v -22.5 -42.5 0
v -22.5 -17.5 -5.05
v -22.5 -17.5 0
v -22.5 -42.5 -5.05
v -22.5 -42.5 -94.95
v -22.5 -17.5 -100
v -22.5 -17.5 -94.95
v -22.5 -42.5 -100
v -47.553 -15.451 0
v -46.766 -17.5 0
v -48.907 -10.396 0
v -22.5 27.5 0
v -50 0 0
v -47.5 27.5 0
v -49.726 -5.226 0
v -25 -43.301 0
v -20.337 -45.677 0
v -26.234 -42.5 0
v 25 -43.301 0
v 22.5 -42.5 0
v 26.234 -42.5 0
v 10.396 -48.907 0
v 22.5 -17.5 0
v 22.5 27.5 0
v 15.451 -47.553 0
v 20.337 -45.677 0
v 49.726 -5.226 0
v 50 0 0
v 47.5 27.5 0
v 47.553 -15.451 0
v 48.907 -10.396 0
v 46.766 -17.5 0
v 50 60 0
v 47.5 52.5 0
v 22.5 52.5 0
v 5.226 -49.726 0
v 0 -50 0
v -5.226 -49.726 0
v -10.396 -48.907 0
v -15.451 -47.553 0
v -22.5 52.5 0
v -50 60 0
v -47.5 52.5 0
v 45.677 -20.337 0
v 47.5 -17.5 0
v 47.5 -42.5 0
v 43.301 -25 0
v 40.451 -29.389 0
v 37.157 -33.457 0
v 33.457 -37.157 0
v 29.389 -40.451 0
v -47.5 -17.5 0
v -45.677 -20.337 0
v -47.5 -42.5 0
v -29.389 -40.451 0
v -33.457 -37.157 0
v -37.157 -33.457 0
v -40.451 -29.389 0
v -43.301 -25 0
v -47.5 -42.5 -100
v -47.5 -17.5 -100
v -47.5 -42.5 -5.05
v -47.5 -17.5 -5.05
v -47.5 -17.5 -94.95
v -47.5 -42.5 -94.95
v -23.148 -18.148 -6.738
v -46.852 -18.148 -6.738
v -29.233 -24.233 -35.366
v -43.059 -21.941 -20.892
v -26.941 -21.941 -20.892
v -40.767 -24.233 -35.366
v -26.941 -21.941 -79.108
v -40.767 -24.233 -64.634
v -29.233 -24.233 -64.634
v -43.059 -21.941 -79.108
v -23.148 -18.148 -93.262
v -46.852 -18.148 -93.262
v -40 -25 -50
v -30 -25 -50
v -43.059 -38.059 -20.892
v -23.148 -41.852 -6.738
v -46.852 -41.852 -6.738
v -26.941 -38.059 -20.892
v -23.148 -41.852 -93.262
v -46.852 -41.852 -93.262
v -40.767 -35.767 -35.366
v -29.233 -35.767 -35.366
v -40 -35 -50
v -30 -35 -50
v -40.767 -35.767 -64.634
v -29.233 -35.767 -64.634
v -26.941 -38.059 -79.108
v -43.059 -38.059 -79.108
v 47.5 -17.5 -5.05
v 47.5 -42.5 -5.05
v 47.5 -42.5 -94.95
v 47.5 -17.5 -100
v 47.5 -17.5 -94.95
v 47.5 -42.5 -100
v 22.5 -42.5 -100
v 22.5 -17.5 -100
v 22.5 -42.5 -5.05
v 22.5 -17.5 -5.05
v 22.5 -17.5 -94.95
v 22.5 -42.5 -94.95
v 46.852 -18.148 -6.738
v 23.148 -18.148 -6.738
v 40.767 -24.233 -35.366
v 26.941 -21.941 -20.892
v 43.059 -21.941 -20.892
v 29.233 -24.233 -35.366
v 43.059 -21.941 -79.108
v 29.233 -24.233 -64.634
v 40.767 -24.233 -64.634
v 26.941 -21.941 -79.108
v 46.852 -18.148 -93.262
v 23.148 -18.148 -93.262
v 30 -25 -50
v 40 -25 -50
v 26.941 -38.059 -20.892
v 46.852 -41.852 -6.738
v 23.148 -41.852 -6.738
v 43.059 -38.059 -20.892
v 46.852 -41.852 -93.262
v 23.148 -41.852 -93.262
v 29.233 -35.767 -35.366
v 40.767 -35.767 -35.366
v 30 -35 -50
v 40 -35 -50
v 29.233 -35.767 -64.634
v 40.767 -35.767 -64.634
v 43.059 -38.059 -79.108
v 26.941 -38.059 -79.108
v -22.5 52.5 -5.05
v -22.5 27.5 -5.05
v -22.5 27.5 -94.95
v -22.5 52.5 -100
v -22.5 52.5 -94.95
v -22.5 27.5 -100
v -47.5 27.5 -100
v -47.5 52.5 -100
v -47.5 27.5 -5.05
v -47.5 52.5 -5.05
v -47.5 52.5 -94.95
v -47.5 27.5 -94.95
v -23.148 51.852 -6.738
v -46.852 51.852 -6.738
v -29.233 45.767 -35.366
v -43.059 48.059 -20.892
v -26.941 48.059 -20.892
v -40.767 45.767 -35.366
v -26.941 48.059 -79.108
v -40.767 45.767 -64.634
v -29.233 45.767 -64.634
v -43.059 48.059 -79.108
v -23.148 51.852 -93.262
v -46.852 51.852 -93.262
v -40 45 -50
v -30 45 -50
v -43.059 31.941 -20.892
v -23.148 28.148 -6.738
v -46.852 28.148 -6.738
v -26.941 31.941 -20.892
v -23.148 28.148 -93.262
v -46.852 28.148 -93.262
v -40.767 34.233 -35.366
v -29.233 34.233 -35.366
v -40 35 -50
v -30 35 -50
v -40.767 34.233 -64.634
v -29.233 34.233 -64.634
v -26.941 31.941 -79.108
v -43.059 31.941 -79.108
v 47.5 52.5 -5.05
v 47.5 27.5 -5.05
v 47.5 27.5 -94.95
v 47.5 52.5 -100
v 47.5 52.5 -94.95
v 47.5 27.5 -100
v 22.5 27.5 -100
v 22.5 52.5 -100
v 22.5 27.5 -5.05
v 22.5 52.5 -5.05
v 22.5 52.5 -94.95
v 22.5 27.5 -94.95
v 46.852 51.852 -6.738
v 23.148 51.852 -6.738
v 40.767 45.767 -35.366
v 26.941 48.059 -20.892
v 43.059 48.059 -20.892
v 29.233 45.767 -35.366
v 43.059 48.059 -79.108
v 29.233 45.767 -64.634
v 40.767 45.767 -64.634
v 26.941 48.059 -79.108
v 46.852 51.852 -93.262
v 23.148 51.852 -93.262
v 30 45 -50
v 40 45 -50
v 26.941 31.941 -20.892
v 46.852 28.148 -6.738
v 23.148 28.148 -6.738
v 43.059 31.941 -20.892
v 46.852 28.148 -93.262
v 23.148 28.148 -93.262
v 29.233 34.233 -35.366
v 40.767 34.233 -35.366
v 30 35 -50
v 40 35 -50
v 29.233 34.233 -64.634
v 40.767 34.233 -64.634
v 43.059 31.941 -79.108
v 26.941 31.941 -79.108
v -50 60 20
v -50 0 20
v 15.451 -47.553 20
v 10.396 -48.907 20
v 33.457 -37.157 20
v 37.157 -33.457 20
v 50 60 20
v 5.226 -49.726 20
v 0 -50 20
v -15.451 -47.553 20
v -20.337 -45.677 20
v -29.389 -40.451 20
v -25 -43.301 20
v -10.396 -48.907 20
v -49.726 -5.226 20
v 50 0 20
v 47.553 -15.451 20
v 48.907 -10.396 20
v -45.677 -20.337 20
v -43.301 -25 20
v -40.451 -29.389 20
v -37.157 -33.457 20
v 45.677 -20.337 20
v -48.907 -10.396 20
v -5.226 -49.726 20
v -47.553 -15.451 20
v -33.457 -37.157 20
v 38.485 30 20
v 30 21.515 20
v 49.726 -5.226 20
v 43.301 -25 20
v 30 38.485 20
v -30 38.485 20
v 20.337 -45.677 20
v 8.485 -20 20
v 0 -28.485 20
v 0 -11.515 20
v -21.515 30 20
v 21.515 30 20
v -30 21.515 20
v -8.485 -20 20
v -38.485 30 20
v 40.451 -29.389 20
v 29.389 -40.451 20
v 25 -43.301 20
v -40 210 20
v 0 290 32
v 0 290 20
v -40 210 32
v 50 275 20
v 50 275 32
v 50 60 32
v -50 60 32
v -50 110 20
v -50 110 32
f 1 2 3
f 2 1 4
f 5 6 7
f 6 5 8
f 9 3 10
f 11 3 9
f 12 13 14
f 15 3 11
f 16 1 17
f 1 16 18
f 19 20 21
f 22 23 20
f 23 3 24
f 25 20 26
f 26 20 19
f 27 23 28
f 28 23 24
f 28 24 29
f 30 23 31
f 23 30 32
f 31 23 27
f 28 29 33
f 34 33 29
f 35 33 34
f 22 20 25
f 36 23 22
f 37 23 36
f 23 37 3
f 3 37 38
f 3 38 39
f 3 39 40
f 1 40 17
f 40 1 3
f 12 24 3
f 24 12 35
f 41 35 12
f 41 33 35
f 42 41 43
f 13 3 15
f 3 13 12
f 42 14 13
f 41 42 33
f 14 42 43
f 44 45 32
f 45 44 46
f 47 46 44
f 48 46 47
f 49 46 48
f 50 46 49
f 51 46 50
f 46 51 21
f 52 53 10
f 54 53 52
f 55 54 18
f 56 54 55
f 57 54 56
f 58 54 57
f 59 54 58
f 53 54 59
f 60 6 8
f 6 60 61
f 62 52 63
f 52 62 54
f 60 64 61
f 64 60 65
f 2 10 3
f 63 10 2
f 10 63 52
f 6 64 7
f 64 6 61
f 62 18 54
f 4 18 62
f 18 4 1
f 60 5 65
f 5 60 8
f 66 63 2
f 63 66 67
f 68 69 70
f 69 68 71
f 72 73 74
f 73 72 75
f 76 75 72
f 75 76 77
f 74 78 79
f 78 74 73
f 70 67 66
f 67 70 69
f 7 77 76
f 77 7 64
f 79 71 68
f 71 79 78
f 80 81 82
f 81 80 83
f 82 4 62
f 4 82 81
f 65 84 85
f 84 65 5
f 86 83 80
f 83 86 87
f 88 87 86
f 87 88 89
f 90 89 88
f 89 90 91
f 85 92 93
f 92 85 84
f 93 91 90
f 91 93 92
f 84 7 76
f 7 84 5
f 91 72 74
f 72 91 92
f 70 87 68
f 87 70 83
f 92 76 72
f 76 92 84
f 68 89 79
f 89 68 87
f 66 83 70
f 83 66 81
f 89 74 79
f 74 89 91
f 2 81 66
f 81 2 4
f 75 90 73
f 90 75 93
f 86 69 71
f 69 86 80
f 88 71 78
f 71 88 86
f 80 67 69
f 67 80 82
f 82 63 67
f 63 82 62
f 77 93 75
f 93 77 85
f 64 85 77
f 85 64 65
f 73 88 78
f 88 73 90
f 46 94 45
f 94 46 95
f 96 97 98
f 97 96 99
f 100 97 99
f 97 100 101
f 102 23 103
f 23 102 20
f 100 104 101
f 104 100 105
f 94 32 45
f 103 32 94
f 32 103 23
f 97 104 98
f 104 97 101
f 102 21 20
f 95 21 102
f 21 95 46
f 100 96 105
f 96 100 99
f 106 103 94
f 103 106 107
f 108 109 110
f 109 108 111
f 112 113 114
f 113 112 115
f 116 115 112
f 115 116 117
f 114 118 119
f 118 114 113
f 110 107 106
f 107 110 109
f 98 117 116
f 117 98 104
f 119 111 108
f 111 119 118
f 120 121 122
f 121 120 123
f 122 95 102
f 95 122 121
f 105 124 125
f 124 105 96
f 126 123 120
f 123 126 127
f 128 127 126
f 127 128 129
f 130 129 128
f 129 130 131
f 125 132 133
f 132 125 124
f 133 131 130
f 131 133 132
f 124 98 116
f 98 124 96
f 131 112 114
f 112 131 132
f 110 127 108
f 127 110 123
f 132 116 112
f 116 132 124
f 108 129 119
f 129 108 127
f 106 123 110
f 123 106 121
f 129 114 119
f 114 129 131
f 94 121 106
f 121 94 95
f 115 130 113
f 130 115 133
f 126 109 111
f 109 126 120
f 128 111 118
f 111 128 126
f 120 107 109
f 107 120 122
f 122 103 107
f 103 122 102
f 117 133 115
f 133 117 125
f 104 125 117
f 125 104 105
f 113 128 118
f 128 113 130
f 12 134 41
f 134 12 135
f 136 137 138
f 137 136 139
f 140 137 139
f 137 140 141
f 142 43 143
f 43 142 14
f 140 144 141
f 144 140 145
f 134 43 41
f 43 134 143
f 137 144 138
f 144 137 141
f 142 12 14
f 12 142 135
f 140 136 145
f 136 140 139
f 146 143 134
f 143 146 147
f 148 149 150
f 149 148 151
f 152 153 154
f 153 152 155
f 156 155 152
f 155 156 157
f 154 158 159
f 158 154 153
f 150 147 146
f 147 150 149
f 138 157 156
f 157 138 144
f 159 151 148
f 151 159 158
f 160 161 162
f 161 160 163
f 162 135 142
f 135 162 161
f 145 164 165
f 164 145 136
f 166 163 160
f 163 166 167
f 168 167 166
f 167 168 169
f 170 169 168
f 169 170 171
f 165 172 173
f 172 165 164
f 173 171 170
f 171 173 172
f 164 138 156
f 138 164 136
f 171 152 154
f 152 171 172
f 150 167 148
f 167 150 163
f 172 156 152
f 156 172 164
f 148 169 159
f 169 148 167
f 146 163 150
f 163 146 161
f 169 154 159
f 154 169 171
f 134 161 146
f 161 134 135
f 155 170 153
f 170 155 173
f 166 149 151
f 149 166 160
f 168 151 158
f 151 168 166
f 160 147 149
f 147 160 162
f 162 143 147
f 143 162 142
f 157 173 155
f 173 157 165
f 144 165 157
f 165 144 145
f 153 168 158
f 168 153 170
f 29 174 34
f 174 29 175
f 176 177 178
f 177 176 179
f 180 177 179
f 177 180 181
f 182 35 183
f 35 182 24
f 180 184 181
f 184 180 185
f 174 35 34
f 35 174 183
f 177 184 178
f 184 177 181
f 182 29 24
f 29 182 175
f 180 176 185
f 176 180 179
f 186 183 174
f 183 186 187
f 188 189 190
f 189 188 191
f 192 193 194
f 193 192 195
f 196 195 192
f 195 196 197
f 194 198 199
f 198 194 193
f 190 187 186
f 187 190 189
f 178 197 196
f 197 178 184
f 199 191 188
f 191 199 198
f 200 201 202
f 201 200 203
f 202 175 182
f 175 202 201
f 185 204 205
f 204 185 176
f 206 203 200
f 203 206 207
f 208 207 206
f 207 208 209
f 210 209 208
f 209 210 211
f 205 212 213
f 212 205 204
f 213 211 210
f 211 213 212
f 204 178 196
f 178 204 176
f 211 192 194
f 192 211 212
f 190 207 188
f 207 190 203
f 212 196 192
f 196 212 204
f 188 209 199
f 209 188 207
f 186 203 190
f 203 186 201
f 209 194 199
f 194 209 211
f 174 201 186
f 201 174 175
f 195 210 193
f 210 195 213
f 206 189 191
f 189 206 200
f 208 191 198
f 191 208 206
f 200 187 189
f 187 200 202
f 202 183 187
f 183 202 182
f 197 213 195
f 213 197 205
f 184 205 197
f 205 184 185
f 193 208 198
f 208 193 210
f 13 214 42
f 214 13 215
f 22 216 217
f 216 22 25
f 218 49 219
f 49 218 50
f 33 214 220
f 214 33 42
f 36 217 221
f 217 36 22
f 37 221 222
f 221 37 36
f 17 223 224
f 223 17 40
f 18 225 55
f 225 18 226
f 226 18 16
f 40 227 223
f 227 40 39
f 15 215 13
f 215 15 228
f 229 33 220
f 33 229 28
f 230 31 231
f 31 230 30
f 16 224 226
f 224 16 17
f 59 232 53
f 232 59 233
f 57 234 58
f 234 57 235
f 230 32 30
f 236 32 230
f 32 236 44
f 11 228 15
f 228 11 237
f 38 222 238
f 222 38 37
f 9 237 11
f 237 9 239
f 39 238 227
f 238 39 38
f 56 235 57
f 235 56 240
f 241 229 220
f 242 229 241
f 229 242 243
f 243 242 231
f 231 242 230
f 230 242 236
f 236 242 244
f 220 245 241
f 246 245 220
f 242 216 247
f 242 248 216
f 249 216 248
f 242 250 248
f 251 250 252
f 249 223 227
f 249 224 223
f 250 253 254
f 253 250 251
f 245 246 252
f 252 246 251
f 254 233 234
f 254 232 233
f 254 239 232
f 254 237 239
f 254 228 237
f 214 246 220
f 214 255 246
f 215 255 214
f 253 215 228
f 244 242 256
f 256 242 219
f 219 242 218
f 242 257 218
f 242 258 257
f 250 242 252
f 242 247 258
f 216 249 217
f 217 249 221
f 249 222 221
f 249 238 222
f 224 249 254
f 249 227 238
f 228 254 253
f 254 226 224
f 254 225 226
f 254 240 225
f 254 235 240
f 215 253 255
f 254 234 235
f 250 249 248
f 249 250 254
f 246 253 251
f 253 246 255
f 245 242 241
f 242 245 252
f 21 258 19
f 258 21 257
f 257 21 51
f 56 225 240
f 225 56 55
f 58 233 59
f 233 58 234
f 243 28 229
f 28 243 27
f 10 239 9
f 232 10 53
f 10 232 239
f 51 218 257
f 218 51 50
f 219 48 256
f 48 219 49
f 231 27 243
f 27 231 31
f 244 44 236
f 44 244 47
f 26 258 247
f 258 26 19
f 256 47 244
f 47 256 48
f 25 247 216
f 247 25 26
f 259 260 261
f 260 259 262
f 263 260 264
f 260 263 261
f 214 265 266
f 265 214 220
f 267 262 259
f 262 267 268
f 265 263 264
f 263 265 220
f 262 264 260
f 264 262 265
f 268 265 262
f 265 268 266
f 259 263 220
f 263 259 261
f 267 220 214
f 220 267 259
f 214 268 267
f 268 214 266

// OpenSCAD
// Stylized Chair Assembly
// Reconstructed from image and description

$fn = 60; // Resolution for curves

// --- Parameters ---
// Seat Dimensions
seat_width = 100;
seat_depth_rect = 60;
seat_radius = 50;
seat_thickness = 20;

// Backrest Dimensions
backrest_height = 215;
backrest_thickness = 12;

// Leg Dimensions
leg_height = 100;
leg_base_size = 25;
leg_waist_radius = 140; // Large radius for concave sides

// Cutout Dimensions
diamond_size = 12;
diamond_depth = 50; // Through cut

// --- Modules ---

// Module for the waisted leg
module waisted_leg() {
    h = leg_height;
    w = leg_base_size;
    cut_pos = 145; 
    
    difference() {
        // Base cube
        cube([w, w, h], center=true);
        
        // Carve the waist (concave cylindrical sides)
        // Front (+Y)
        translate([0, cut_pos, 0]) rotate([0, 90, 0]) 
            cylinder(h=w+10, r=leg_waist_radius, center=true);
            
        // Back (-Y)
        translate([0, -cut_pos, 0]) rotate([0, 90, 0]) 
            cylinder(h=w+10, r=leg_waist_radius, center=true);
            
        // Right (+X)
        translate([cut_pos, 0, 0]) rotate([90, 0, 0]) 
            cylinder(h=w+10, r=leg_waist_radius, center=true);
            
        // Left (-X)
        translate([-cut_pos, 0, 0]) rotate([90, 0, 0]) 
            cylinder(h=w+10, r=leg_waist_radius, center=true);
    }
}

// Module for diamond cutout
module diamond_cutout(size, depth) {
    // A diamond shape (rotated square)
    rotate([0, 0, 45]) 
        cube([size, size, depth], center=true);
}

// Module for seat 2D profile
module seat_profile_2d() {
    union() {
        // Rectangle part (Back part of seat)
        // Centered in X, starting at Y=0
        translate([-seat_width/2, 0, 0]) 
            square([seat_width, seat_depth_rect]);
        // Semicircle part (Front part of seat)
        // Centered at origin
        circle(r=seat_radius);
    }
}

// Module for backrest solid
module backrest_solid() {
    // Backrest Leaf Profile (XZ plane relative to its base)
    // Approximating the pointed leaf shape described
    leaf_points = [
        [-50, 0],       // Bottom Left
        [50, 0],        // Bottom Right
        [50, 215],      // Top Right (Vertical edge)
        [0, 230],       // Top Tip (Pointed)
        [-40, 150],     // Mid Left (Curved in)
        [-50, 50],      // Lower Left (Curved out)
        [-50, 0]        // Close loop
    ];
    
    linear_extrude(height=backrest_thickness) 
        polygon(leaf_points);
}

// --- Main Assembly ---

difference() {
    union() {
        // Seat Base
        // Seat Bottom at Z=0. Top at Z=seat_thickness.
        // Profile is in XY plane.
        linear_extrude(height=seat_thickness) 
            seat_profile_2d();
            
        // Backrest
        // Attached to back of seat (Y=seat_depth_rect = 60).
        // Rises from Z=seat_thickness (20).
        // Thickness extends in +Y direction.
        translate([0, seat_depth_rect, seat_thickness]) 
            backrest_solid();
            
        // Legs
        // 4 legs under the seat.
        // Seat X: -50..50, Y: -50..60.
        // Leg positions (inset from edges):
        
        // Front Left
        translate([-35, -30, -leg_height/2]) waisted_leg();
        // Front Right
        translate([35, -30, -leg_height/2]) waisted_leg();
        // Back Left
        translate([-35, 40, -leg_height/2]) waisted_leg();
        // Back Right
        translate([35, 40, -leg_height/2]) waisted_leg();
    }
    
    // --- Cutouts ---
    
    // Seat Top Diamonds
    // Seat Top is at Z=seat_thickness.
    // Diamond 1 (Front Center)
    translate([0, -20, seat_thickness + diamond_depth/2]) 
        diamond_cutout(diamond_size, diamond_depth);
    // Diamond 2 (Back Left)
    translate([-30, 30, seat_thickness + diamond_depth/2]) 
        diamond_cutout(diamond_size, diamond_depth);
    // Diamond 3 (Back Right)
    translate([30, 30, seat_thickness + diamond_depth/2]) 
        diamond_cutout(diamond_size, diamond_depth);
        
    // Backrest Diamonds
    // Backrest is at Y=60..72, Z=20..235 (global).
    // Cluster around X=0, Z=120 (local to backrest base).
    // "wall normals tilted approximately 30°" -> rotate around X axis.
    
    // Diamond 1 (Top)
    translate([0, seat_depth_rect + backrest_thickness/2, seat_thickness + 160]) 
        rotate([30, 0, 0]) 
            diamond_cutout(diamond_size, diamond_depth);
    // Diamond 2 (Left)
    translate([-20, seat_depth_rect + backrest_thickness/2, seat_thickness + 130]) 
        rotate([30, 0, 0]) 
            diamond_cutout(diamond_size, diamond_depth);
    // Diamond 3 (Right)
    translate([20, seat_depth_rect + backrest_thickness/2, seat_thickness + 130]) 
        rotate([30, 0, 0]) 
            diamond_cutout(diamond_size, diamond_depth);
    // Diamond 4 (Bottom)
    translate([0, seat_depth_rect + backrest_thickness/2, seat_thickness + 100]) 
        rotate([30, 0, 0]) 
            diamond_cutout(diamond_size, diamond_depth);
}
